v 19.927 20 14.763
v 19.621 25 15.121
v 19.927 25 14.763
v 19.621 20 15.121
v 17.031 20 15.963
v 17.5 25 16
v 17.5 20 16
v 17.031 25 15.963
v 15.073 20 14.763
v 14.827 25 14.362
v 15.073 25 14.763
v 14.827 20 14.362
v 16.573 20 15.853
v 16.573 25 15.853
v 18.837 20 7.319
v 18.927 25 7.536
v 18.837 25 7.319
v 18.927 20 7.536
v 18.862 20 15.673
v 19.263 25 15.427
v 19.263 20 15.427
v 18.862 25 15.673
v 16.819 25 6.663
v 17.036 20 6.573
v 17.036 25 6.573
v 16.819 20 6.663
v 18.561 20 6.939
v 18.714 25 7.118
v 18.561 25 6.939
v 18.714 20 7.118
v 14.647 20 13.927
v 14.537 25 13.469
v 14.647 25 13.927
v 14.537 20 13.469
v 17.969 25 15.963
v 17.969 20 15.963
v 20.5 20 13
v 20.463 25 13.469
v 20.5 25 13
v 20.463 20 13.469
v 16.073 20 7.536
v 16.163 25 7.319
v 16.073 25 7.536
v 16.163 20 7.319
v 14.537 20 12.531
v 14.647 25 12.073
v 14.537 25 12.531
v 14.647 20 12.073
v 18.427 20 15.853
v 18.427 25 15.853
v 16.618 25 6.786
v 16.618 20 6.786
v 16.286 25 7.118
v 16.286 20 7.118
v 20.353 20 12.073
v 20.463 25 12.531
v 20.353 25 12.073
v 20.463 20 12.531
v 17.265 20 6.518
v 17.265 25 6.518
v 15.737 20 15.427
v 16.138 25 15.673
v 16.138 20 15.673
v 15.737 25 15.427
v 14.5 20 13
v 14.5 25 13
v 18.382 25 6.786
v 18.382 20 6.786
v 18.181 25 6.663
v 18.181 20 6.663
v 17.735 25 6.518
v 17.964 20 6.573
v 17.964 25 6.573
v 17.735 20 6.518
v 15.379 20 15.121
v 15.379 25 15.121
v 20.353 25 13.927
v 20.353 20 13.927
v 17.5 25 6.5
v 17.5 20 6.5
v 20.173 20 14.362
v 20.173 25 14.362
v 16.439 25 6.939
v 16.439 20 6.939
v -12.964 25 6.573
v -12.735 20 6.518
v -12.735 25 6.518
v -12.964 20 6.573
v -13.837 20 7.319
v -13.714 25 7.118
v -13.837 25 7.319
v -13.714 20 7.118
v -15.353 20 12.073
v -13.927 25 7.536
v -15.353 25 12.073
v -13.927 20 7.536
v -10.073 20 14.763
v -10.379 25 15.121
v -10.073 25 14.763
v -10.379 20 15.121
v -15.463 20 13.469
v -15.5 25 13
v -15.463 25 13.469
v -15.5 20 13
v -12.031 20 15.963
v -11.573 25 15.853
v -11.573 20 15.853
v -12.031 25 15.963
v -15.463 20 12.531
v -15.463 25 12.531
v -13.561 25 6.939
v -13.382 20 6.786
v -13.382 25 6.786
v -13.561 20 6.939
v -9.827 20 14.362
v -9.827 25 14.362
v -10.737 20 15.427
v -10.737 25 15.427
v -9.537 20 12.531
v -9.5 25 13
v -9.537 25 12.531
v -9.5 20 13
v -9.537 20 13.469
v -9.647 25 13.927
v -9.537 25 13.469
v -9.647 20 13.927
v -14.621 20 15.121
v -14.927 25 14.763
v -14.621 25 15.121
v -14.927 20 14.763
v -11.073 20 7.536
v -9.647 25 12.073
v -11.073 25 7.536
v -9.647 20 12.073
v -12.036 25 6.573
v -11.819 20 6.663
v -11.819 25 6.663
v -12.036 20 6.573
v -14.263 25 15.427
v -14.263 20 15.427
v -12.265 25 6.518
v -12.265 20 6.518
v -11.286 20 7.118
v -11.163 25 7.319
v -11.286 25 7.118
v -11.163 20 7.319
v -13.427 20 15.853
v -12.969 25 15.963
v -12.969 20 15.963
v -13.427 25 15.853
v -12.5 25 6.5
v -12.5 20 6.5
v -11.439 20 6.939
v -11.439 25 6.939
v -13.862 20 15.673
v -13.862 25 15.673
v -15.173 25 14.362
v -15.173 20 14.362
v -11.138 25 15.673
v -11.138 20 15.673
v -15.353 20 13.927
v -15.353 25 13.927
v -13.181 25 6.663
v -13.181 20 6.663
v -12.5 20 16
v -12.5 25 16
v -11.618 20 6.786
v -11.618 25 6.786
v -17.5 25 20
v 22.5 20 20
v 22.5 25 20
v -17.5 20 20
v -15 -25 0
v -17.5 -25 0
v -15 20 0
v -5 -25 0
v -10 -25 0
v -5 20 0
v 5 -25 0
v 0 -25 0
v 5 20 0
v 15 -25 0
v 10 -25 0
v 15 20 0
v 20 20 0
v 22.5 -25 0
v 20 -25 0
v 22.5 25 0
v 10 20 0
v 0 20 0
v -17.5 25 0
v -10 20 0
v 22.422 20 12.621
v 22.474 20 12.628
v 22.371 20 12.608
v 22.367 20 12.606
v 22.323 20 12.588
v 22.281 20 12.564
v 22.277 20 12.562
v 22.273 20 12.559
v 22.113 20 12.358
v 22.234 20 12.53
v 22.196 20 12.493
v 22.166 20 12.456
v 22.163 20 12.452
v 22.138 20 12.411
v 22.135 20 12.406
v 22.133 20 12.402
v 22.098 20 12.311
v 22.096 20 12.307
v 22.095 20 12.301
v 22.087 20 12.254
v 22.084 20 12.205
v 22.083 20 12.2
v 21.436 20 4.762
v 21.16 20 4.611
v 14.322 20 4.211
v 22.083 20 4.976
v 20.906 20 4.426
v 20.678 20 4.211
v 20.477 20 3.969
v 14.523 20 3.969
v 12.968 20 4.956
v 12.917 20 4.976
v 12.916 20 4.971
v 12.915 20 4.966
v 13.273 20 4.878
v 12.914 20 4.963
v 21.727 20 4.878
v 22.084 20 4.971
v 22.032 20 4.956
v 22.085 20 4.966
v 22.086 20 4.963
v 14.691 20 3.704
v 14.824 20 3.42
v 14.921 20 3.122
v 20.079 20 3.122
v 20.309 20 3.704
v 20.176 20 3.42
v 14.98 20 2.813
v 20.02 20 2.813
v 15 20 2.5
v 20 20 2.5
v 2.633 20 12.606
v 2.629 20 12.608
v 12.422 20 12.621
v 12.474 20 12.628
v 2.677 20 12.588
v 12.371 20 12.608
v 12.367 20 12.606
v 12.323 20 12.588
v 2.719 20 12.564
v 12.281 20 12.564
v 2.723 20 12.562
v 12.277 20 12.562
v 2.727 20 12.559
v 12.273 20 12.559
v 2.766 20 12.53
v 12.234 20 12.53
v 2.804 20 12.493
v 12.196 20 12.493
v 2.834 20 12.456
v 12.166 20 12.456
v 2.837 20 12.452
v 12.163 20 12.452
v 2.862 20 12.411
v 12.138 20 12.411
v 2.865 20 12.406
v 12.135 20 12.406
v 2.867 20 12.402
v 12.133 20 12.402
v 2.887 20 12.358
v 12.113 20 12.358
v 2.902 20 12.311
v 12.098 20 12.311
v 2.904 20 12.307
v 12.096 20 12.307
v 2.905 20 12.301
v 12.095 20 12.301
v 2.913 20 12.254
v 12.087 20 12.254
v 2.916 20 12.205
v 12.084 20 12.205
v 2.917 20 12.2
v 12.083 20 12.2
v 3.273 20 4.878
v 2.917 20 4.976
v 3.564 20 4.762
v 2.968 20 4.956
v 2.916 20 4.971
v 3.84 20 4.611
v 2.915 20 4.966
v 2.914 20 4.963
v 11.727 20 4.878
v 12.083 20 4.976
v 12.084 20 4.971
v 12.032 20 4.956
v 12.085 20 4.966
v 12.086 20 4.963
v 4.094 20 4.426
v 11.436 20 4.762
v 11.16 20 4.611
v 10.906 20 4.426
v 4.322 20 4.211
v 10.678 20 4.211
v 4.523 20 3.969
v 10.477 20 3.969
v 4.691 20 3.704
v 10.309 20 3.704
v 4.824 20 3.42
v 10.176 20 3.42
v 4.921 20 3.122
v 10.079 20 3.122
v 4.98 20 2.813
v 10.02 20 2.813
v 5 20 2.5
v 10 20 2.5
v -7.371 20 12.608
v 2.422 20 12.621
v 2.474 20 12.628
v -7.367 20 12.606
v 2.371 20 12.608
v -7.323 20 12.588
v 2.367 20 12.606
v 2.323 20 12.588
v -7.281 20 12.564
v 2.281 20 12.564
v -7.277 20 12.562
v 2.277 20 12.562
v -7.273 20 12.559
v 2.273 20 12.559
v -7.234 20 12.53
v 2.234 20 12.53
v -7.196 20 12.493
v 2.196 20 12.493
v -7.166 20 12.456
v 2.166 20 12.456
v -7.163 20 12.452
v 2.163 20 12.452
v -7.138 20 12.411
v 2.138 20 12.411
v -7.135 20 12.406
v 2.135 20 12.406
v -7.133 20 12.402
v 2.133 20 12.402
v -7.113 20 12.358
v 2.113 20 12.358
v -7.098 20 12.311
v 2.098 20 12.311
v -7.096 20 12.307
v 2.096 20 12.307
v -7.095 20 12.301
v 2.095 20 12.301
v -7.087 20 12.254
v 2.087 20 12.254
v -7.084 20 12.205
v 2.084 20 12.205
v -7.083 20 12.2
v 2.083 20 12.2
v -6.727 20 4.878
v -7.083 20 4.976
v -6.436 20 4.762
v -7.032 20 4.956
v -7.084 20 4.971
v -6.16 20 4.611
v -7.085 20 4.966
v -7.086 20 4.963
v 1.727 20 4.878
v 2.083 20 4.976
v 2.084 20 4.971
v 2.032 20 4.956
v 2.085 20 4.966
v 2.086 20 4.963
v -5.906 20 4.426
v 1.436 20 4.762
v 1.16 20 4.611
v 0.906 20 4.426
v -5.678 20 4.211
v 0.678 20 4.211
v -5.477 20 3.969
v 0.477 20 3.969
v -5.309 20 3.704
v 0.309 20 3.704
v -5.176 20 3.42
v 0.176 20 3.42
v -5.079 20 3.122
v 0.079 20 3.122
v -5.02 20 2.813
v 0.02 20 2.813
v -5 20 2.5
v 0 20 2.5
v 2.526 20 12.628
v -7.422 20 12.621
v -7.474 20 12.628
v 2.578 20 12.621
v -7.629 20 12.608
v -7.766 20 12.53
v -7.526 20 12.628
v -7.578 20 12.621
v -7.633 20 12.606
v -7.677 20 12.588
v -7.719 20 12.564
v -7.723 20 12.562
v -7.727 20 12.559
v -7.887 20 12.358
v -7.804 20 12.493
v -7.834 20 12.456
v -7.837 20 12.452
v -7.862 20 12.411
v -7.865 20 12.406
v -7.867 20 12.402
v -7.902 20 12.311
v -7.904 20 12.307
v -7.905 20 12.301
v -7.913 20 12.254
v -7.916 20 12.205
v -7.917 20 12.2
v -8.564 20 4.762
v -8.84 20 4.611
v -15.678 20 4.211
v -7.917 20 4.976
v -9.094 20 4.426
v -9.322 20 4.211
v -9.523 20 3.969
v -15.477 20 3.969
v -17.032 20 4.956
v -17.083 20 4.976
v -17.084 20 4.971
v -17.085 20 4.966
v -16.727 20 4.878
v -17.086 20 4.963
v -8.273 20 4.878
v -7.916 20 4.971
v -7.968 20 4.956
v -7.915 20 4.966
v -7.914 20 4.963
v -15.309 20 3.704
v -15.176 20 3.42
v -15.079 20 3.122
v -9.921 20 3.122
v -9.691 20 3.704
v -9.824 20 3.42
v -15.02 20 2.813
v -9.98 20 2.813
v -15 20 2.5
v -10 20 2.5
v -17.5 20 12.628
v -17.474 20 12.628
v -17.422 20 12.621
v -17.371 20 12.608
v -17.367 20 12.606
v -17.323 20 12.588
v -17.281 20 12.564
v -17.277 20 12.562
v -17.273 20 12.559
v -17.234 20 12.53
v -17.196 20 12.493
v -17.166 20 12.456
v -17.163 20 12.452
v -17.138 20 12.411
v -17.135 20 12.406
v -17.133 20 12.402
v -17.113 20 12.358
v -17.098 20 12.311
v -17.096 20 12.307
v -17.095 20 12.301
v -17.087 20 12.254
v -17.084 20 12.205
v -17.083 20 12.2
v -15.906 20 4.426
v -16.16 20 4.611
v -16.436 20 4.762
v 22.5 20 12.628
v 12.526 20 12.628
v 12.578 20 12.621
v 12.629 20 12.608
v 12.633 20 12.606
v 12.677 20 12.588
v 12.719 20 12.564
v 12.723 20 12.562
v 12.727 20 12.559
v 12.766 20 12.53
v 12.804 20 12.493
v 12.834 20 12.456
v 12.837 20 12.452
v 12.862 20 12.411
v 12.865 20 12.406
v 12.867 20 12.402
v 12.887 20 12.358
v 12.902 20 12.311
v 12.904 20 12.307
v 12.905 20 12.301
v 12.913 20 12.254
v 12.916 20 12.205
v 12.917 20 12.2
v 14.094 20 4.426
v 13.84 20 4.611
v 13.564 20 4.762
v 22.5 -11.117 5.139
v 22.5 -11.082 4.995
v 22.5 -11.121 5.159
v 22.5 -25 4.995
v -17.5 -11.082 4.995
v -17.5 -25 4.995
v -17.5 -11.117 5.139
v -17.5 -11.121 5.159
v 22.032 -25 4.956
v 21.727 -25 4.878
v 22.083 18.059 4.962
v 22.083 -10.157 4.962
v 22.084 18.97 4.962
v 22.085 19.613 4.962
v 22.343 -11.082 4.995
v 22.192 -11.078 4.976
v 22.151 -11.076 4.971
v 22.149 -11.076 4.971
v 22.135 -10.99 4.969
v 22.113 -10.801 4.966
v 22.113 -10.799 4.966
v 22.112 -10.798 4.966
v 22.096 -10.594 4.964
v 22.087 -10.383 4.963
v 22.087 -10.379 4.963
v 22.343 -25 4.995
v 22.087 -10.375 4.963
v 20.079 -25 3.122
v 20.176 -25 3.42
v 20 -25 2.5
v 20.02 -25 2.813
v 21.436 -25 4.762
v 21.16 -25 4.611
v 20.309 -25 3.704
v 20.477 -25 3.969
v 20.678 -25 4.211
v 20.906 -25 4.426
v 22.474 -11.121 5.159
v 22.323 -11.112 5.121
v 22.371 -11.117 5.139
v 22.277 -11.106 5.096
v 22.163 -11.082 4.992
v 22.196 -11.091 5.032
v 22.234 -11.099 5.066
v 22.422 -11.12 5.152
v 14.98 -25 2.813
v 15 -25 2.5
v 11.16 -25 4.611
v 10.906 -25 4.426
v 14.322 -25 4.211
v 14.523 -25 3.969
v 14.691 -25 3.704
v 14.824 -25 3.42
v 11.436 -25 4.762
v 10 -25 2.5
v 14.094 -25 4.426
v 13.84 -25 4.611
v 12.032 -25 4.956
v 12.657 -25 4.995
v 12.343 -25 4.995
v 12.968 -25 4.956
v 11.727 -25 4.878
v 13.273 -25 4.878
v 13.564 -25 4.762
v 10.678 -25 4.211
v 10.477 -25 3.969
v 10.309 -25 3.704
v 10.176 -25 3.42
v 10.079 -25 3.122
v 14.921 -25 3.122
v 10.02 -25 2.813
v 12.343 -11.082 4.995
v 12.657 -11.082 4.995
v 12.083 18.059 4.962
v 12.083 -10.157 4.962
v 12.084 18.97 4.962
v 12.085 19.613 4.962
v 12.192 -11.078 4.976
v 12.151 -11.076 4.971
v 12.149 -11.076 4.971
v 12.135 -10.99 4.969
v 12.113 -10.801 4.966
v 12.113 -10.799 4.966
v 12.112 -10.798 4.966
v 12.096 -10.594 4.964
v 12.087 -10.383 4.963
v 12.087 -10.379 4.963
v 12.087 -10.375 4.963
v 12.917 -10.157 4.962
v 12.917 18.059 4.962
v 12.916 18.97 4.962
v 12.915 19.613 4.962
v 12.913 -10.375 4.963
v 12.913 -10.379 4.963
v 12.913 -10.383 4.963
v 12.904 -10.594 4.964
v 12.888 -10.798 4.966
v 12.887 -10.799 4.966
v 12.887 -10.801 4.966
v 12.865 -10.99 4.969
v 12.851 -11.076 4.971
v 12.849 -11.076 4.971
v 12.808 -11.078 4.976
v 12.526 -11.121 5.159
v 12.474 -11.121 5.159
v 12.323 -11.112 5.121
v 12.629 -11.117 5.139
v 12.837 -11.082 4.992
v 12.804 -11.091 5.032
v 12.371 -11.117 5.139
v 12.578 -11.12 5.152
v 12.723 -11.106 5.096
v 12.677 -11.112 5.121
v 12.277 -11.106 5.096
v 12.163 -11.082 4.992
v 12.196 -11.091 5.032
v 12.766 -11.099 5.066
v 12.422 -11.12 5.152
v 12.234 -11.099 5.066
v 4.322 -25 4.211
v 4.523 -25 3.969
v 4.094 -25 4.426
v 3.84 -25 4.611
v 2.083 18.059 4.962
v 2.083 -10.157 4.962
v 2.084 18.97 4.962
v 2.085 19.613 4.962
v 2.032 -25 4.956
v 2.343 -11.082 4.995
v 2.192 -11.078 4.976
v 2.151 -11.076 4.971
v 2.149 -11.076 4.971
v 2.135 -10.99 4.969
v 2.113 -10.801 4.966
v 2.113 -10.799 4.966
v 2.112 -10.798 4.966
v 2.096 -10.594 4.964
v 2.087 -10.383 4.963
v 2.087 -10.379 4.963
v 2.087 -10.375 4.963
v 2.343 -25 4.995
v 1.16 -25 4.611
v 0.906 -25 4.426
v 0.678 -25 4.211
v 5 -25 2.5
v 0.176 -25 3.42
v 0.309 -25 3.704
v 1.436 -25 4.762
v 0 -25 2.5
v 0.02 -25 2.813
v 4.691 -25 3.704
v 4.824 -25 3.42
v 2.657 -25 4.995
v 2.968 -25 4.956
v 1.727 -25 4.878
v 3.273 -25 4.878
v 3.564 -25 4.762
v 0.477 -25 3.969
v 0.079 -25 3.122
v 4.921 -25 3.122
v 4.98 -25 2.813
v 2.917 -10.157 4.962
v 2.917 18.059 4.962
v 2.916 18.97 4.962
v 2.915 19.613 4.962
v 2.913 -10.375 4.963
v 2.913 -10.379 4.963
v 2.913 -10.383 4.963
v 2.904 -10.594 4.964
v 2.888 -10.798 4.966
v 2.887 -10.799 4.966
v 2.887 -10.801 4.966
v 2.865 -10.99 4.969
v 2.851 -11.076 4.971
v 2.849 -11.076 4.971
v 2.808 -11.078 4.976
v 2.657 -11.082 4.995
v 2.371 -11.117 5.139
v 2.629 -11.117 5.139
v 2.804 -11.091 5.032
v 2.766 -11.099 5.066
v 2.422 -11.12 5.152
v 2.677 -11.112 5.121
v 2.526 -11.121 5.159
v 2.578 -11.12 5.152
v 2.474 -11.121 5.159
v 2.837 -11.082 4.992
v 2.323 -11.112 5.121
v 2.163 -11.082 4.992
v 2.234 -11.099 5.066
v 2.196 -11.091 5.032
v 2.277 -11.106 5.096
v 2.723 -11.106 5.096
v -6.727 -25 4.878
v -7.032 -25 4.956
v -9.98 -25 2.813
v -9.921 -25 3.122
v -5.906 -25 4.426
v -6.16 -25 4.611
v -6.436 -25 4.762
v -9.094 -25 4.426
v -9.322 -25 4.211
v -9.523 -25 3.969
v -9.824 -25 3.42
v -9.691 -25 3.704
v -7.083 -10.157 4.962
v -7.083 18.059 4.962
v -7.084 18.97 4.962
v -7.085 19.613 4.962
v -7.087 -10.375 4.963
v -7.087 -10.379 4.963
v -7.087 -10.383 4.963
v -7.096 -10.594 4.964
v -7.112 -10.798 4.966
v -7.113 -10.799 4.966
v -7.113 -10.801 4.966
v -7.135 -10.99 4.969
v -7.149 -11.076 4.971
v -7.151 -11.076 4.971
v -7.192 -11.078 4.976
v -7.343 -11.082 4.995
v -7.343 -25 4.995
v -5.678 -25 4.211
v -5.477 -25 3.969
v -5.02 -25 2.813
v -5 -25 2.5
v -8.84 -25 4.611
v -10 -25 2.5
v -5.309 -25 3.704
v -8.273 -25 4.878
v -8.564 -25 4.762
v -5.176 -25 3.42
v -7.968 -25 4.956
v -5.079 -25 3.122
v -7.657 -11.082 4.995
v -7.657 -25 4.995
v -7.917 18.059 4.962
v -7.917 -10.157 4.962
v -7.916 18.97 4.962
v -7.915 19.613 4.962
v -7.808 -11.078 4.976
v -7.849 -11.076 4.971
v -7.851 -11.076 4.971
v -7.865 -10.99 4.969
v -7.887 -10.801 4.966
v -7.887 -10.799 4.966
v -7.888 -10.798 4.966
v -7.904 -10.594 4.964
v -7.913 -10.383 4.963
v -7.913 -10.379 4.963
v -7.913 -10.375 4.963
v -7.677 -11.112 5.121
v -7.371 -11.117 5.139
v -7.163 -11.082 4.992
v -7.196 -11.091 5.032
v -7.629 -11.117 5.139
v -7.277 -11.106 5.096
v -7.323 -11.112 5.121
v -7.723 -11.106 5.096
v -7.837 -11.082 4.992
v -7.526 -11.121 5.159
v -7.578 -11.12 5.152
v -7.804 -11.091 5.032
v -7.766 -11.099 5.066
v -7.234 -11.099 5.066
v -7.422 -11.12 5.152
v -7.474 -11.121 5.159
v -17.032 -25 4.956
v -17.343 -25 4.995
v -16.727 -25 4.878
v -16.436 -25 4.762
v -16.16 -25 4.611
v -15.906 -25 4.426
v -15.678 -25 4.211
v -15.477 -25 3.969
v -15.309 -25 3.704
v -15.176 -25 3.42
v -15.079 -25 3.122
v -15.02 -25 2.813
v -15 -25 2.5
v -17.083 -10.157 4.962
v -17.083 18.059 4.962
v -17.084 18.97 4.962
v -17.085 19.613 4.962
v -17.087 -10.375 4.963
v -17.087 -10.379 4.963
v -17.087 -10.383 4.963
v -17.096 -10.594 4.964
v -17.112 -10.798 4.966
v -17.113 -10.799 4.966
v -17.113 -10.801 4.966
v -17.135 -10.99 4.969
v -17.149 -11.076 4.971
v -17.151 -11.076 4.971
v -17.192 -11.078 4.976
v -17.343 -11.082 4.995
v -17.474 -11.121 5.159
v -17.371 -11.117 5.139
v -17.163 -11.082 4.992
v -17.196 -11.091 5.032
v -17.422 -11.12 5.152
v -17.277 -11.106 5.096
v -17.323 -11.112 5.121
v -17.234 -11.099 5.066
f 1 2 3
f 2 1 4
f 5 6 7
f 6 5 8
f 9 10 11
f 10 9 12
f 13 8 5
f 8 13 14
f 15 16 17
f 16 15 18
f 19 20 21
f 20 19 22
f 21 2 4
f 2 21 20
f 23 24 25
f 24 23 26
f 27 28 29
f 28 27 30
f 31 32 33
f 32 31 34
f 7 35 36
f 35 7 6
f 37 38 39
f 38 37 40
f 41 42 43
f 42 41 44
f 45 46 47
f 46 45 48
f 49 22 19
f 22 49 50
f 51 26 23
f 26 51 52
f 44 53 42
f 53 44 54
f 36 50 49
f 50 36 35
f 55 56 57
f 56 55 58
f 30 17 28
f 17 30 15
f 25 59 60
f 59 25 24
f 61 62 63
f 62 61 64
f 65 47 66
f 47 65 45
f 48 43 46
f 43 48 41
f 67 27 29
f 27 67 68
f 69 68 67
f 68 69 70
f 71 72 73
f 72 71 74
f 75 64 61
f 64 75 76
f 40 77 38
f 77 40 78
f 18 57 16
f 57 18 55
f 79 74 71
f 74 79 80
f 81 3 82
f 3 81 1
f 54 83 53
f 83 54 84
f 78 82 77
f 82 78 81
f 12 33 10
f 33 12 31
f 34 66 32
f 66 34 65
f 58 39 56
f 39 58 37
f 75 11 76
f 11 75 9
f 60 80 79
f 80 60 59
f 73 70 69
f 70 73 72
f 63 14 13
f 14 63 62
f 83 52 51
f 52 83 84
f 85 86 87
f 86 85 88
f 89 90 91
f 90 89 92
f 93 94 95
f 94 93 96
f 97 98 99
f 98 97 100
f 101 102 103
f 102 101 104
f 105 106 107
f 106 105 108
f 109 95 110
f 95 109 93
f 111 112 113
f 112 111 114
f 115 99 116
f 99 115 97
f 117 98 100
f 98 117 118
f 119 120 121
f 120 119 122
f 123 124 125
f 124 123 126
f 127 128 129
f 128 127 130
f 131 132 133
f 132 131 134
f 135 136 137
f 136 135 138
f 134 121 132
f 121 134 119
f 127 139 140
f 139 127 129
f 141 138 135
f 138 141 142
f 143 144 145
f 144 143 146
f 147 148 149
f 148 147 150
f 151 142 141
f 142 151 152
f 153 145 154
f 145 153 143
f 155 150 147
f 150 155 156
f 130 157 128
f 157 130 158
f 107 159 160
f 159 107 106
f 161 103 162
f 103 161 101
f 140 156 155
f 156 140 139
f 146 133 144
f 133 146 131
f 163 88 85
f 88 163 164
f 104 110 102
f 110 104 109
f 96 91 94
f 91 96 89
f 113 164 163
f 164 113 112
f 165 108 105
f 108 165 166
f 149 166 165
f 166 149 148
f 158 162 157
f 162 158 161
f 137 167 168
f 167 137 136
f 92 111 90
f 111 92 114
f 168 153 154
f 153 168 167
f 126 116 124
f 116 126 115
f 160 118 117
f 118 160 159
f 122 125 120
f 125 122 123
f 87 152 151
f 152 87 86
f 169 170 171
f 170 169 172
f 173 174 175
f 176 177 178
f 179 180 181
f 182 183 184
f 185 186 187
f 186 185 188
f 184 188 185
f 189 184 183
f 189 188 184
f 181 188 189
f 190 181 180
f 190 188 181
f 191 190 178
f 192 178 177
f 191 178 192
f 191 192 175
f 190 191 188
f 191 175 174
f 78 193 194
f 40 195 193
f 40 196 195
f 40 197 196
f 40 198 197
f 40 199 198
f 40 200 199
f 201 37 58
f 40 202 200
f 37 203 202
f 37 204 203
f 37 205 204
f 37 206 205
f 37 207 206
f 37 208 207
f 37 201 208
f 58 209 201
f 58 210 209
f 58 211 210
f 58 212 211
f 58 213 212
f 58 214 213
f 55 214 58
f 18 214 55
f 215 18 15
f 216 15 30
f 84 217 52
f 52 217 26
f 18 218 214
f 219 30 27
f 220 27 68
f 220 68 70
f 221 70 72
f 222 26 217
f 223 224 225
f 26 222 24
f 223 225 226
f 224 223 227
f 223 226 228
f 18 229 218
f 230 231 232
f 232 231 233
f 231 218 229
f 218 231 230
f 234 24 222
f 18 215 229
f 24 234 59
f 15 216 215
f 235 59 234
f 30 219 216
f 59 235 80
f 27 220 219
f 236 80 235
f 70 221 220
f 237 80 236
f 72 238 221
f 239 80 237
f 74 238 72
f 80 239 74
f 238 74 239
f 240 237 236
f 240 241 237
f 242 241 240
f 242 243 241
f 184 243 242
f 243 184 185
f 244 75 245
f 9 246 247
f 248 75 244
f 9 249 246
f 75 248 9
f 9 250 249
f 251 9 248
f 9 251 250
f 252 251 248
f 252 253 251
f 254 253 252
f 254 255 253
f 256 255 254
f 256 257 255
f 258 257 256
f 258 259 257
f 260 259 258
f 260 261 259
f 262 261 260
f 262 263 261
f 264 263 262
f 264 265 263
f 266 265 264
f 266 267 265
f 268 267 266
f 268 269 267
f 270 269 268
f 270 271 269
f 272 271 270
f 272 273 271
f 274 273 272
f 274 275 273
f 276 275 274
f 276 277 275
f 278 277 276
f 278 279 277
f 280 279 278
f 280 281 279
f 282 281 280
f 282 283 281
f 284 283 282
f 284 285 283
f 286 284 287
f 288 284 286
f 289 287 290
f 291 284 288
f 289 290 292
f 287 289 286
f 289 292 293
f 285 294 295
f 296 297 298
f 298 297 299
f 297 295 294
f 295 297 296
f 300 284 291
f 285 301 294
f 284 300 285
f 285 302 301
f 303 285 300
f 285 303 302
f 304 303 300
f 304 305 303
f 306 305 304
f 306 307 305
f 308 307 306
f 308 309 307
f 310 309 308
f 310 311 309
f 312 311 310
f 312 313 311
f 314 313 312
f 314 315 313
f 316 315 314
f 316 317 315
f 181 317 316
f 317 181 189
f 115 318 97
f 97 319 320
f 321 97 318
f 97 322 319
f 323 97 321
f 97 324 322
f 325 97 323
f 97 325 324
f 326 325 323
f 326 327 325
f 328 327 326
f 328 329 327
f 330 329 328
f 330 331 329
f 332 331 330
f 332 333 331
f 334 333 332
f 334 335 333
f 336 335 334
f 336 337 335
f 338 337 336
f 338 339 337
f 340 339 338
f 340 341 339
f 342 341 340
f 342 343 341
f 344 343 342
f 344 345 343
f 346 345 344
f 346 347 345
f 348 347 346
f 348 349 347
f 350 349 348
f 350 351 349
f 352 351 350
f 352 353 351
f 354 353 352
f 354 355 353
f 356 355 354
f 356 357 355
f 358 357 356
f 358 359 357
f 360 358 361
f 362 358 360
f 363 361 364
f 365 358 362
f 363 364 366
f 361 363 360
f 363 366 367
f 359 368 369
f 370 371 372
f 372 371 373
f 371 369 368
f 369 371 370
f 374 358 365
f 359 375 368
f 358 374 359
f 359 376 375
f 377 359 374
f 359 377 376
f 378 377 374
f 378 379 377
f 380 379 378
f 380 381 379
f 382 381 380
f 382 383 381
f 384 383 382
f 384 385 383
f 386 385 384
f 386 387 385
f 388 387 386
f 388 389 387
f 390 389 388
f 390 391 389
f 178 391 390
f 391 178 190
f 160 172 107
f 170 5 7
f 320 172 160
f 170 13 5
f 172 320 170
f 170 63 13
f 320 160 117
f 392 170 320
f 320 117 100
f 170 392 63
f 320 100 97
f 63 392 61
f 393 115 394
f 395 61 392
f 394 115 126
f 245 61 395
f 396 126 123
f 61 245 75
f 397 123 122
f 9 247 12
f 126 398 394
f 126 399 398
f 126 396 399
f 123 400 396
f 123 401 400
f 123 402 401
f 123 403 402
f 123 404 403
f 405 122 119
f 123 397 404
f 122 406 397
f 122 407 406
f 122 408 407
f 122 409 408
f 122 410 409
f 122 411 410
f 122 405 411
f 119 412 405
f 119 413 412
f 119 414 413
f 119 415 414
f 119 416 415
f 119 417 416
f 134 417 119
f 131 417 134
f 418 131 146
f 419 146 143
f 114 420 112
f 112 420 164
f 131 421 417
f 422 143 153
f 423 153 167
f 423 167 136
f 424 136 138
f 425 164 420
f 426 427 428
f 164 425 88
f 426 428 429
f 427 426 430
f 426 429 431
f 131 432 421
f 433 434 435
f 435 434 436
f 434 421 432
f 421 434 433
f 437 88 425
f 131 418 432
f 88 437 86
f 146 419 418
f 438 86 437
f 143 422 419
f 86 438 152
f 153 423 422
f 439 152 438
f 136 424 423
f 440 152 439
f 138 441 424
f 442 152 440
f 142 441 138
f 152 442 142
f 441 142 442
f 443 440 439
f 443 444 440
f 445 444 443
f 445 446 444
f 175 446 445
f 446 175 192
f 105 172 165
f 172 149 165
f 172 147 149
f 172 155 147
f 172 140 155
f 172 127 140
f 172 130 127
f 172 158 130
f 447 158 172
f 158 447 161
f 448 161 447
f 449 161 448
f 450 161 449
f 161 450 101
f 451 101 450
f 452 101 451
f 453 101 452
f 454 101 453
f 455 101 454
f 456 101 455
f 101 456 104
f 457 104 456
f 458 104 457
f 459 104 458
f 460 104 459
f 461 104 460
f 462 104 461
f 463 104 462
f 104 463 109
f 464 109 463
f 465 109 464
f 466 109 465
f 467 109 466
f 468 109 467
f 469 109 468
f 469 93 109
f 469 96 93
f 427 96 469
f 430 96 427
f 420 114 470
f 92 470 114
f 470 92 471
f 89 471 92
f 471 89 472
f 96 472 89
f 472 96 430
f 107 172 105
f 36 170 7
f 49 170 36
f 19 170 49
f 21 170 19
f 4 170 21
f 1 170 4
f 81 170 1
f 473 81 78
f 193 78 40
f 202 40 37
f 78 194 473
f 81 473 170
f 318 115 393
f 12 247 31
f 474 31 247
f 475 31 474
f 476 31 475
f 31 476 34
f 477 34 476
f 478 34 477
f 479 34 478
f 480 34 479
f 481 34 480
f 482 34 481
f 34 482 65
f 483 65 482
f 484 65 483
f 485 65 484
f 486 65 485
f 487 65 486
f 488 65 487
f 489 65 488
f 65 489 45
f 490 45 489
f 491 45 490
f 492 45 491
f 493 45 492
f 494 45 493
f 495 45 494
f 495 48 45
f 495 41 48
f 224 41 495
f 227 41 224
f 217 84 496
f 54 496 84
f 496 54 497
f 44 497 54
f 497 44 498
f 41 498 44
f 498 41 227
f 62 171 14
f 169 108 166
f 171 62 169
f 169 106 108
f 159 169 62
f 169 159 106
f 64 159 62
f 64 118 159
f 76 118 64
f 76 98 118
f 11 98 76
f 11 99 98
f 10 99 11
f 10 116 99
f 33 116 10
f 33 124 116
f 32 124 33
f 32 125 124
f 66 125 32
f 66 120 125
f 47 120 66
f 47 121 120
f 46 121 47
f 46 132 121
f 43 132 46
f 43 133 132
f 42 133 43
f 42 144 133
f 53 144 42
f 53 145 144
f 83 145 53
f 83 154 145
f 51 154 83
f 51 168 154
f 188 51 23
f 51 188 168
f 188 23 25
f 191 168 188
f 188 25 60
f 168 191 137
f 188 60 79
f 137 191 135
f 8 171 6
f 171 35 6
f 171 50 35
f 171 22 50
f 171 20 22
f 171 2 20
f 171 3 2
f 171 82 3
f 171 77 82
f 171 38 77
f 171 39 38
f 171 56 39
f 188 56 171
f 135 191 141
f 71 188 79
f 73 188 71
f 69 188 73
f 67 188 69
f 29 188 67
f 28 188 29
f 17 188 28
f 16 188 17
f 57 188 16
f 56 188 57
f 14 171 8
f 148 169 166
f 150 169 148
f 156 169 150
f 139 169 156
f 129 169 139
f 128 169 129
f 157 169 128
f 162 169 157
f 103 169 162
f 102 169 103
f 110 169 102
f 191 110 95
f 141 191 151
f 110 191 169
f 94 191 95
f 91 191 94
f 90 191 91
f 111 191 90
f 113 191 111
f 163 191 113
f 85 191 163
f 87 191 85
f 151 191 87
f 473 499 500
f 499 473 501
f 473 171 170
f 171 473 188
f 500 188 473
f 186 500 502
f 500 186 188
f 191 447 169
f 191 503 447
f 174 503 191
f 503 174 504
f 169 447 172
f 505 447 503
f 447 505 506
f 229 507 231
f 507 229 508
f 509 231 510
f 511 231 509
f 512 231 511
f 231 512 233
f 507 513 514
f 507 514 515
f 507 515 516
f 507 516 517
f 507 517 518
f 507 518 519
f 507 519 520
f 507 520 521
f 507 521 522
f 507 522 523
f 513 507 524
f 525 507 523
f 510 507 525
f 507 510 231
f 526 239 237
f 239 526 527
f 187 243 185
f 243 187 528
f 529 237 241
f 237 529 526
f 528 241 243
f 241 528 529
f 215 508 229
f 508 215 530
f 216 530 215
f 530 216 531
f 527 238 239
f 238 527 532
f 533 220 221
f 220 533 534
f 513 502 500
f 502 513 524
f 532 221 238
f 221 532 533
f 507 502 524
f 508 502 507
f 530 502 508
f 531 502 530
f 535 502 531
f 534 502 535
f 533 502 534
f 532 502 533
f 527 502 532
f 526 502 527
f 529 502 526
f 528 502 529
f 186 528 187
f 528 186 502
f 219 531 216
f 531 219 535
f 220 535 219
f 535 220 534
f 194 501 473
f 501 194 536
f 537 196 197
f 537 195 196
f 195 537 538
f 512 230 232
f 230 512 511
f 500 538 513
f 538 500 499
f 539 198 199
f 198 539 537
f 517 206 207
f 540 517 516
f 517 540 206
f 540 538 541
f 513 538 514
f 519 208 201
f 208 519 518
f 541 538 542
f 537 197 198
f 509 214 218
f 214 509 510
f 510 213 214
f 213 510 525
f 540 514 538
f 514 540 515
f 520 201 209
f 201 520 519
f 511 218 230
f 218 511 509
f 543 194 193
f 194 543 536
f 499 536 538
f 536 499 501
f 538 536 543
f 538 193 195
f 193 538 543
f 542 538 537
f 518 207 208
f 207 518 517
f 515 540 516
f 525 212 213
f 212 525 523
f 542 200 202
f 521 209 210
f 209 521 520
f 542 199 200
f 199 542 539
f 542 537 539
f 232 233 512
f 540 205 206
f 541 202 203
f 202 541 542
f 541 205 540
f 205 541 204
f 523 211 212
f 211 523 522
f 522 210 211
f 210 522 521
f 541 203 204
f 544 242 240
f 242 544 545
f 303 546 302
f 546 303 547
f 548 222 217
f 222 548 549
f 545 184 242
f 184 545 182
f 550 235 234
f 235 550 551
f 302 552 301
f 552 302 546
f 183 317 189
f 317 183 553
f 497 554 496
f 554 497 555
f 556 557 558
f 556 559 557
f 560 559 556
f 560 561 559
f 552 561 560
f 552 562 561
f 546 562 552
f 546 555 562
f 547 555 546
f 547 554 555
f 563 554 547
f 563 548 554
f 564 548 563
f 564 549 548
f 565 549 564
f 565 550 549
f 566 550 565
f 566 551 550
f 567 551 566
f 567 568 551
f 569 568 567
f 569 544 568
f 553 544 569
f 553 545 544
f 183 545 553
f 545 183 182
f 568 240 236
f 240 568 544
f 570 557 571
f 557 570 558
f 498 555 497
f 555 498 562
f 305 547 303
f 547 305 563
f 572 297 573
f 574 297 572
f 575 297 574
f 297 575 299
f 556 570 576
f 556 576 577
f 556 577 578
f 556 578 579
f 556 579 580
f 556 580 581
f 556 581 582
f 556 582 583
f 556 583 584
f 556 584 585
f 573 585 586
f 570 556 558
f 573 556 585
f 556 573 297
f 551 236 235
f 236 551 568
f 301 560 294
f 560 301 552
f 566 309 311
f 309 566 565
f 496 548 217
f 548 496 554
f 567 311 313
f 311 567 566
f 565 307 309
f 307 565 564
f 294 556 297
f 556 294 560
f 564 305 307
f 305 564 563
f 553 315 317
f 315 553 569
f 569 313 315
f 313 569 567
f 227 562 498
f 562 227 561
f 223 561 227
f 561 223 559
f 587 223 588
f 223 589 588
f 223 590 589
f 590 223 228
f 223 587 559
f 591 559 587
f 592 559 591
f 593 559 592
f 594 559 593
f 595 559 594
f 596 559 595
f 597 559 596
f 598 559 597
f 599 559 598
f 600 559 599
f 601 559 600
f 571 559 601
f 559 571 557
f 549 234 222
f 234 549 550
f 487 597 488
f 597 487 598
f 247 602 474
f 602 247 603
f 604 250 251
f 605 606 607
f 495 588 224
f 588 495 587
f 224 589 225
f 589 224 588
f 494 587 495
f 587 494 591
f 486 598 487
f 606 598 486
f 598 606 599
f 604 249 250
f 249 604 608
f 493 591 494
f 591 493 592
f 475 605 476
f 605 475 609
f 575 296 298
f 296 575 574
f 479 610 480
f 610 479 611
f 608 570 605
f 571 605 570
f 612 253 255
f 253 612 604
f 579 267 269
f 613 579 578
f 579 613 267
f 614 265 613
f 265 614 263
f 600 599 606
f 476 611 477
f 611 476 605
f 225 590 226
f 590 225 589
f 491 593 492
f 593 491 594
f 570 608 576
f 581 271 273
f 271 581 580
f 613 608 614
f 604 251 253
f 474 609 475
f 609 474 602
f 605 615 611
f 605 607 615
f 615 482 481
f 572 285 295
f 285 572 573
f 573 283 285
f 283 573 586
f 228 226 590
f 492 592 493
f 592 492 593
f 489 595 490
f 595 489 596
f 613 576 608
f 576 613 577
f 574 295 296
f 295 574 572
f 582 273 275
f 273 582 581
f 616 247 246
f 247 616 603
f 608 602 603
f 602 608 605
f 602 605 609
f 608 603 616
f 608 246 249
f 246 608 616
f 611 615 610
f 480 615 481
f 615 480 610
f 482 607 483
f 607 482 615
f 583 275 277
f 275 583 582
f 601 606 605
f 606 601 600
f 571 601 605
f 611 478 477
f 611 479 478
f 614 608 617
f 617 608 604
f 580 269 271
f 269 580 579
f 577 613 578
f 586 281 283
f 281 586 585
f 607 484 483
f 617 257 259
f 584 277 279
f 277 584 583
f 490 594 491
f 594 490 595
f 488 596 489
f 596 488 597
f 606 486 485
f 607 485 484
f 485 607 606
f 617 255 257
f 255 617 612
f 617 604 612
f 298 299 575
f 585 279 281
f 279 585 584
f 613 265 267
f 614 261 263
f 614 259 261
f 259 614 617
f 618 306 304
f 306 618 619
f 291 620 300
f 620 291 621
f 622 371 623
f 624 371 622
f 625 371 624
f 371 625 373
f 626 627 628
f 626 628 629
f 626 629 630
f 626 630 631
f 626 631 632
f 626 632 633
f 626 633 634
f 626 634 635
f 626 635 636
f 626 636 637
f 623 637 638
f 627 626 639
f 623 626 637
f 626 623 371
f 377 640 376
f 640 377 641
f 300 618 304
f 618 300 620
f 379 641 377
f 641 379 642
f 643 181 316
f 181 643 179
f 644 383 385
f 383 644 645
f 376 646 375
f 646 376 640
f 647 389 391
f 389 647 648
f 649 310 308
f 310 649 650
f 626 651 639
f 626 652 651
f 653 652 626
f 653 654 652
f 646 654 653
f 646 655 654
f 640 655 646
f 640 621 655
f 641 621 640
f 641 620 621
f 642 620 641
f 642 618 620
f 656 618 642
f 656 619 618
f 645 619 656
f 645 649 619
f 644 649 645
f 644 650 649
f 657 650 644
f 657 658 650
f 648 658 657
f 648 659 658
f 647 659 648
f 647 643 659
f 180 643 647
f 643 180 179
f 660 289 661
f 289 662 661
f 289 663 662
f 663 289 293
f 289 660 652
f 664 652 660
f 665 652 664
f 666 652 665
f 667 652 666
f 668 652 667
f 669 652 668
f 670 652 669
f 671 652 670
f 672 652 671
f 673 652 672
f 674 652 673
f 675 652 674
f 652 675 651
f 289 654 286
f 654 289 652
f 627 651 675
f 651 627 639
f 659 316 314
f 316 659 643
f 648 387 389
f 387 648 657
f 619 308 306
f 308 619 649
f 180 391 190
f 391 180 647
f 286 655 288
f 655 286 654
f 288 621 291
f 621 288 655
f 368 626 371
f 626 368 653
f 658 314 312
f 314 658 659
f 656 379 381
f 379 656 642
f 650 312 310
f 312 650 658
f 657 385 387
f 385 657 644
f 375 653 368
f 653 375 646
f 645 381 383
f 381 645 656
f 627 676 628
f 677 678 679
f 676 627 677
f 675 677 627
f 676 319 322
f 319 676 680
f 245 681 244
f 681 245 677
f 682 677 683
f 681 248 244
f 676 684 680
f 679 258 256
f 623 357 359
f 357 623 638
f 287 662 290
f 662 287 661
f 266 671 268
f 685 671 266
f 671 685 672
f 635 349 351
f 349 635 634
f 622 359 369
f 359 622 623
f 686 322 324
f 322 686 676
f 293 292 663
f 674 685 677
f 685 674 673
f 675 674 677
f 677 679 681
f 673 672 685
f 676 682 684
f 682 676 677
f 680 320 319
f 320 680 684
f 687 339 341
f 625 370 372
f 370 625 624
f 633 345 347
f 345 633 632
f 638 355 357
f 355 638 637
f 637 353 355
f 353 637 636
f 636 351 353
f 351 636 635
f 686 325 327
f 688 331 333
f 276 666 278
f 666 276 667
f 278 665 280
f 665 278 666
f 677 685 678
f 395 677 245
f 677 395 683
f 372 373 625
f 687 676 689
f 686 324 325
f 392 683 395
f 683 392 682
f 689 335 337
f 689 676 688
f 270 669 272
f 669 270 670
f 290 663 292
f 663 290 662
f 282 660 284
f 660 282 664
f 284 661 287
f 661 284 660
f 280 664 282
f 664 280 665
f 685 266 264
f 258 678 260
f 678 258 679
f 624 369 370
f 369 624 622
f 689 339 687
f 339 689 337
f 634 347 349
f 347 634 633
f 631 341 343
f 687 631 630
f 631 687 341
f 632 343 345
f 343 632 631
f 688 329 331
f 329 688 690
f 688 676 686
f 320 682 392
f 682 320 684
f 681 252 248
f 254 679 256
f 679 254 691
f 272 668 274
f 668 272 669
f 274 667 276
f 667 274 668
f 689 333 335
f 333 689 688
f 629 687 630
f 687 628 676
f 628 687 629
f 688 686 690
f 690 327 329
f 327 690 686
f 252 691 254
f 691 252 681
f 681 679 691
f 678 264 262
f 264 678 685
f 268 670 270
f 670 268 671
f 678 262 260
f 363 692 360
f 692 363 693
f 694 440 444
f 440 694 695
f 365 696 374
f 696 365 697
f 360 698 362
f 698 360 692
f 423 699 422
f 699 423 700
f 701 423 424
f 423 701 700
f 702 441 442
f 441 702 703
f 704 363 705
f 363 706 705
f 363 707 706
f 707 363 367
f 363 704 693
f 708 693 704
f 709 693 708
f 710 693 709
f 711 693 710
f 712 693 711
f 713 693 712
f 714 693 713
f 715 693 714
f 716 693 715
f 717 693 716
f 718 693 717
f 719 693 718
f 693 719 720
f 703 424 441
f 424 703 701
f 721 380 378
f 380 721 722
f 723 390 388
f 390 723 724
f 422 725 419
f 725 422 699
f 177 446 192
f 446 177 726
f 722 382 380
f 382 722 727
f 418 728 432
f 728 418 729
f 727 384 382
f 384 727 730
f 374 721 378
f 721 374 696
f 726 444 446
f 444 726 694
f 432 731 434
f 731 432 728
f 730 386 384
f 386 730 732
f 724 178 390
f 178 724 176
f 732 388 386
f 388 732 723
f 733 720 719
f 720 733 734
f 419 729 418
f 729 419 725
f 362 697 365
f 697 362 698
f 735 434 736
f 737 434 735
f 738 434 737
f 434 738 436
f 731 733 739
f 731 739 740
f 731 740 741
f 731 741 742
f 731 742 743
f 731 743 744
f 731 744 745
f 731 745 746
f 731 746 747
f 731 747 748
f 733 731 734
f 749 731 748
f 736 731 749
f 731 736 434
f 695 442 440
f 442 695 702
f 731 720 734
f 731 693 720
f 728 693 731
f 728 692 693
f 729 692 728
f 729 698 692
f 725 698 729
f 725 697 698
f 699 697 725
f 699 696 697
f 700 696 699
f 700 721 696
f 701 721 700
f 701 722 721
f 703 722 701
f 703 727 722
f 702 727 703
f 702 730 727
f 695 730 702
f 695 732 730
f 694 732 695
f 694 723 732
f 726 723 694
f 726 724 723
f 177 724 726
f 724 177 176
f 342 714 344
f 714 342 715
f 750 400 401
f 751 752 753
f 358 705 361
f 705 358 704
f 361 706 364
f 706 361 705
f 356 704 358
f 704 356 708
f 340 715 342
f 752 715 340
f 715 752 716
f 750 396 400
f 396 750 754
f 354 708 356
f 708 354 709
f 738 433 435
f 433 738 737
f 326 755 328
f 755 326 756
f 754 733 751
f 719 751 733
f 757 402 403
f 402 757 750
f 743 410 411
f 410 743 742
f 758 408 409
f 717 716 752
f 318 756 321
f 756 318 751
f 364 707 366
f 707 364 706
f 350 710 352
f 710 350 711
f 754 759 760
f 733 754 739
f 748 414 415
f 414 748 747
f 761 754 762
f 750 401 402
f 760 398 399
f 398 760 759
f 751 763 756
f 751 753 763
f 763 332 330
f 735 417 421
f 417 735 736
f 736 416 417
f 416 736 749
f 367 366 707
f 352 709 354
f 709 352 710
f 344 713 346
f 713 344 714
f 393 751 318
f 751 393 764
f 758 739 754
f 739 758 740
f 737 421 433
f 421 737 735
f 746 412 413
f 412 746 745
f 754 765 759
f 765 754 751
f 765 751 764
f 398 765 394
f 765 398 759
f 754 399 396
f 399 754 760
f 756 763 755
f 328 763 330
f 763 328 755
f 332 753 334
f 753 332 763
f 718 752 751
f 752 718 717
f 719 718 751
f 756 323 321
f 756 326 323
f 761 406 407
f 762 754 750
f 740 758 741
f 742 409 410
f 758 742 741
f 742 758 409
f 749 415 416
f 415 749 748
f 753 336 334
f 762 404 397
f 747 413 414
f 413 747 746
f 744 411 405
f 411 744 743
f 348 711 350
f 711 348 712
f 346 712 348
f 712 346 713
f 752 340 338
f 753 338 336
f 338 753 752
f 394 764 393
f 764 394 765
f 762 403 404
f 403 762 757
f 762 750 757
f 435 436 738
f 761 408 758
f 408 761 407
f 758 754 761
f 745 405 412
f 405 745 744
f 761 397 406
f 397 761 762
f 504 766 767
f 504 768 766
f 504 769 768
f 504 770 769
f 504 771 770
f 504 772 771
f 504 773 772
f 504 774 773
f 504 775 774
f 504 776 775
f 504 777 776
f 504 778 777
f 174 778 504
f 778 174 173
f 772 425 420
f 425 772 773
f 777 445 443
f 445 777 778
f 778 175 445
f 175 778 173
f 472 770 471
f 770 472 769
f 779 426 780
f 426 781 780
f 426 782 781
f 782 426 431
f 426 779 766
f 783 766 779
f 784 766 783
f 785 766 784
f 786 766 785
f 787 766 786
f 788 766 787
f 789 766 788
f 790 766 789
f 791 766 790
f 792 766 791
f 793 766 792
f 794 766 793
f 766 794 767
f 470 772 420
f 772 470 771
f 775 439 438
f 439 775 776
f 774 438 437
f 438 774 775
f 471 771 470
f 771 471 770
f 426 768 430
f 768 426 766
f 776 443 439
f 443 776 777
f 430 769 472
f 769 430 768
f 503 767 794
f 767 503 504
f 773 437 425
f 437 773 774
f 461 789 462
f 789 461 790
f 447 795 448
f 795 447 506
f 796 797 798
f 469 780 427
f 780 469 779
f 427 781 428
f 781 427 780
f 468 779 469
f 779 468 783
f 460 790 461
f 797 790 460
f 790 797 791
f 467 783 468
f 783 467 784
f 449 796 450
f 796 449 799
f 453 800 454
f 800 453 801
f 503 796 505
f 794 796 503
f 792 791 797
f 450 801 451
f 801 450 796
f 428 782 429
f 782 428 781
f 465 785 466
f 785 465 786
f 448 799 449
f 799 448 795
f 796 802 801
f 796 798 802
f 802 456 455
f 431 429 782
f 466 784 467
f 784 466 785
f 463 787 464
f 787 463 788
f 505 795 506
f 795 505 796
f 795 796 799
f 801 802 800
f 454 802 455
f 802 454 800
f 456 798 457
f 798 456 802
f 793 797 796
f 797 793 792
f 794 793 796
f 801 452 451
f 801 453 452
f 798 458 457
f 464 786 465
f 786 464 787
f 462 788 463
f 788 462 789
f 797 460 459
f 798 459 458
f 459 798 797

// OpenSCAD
/******************************************************************************/
/**********                     INFO                                 **********/
/******************************************************************************/

/*
Wall Mount Test lead Hanger Rev 1.1 March 2016
you can adjust the number of fingers, length and gap.  
The wall mount piece will auto adjust total width to accommodate the above parameters
by David Buhler

1.1
-added hole size fix for small finger gaps and large wall mount hole size
-fixed minimum finger length support cylinder length
-adjusted variable settings for customizer so user input doesn't create wierd holes and gaps
-added side trimming to reduce size and plastic use.

*/

/******************************************************************************/
/**********                     Settings                             **********/
/******************************************************************************/
//adjust the follow to meet your needs,  all measurements in mm.

/* [BACK] */
//Height of wall mounting plate
back_height=20;//[12:50]

//Mounting plate thickness
back_thickness=5;//[3:10] 

/* [FINGERS] */
//Finger slope(degrees)
back_tilt=0;//[0:8]

//Number of fingers
numberof_fingers=5;//[3:15]

//Slot length
finger_length=50;//[20:100]

//determines weight holding ability
finger_thickness=5; //[2:7]

//how much room for the clips
finger_width=5; //[5:20]

//how wide the slot will be(cable thickness)
finger_gap=5;//[1:15]

/* [SCREW-HOLES] */
//add mounting holes?
mount_holes="yes";//[yes,no]

//thread size in mm
hole_size=3;//[1:6]

/* [FINGER SHAPE] */
//select one the the two following finger shapes
finger_shape="round";//[round,square]
//Trim the sides?
trim_sides= "yes"; // [yes,no]


/* [BUILD PLATE] */
//for display only, doesn't contribute to final object
build_plate_selector = 3; //[0:Replicator 2,1: Replicator,2:Thingomatic,3:Manual]
//when Build Plate Selector is set to "manual" this controls the build plate x dimension
build_plate_manual_x = 200; //[100:400]
//when Build Plate Selector is set to "manual" this controls the build plate y dimension
build_plate_manual_y = 200; //[100:400]
build_plate(build_plate_selector,build_plate_manual_x,build_plate_manual_y);

/******************************************************************************/
/**********                   Variable Calcs                         **********/
/****placement of the finger support structure, no need to adjust these********/
/******************************************************************************/
/* [HIDDEN] */
s_width=finger_width/6; //Support triangle width  could just make a fixed width rather than based on finger width
s_height=back_height/2.5;//Support triangle height based on the back height
s_length=finger_length/3*2;//Support triangle lenght based on the finger length 
s_placement_x=(finger_width/2)-(s_width/2);//where to place the X starting point of the support 
s_placement_y=back_thickness/3; //where to place the Y starting point of the support, /3 to accommodate the back tilt 
s_placement_z=finger_thickness;//where to place the Z starting point of the support 


/******************************************************************************/
/**********                  Make It Happen Stuff                    **********/
/******************************************************************************/

echo ("Project Size (wide x height x finger length " ,numberof_fingers*(finger_width+finger_gap)," x ",back_height," x ",finger_length+back_thickness);

//centre the whole project on x0,y0
rotate ([0,0,180])translate ([-(numberof_fingers*(finger_width+finger_gap))/2,-finger_length/2,0])
    {
    difference()//had to stick three difference calls to trim sides.  weird!
        { 
       if (mount_holes=="yes")
            {
            rotate ([back_tilt,0,0]) 
                difference()
                {
                cube([(numberof_fingers*(finger_width+finger_gap))-finger_gap,back_thickness,back_height]);//make plate with auto width based on fingers+width+gap
                Holes ();
                };
            }
        else
            {
            rotate ([back_tilt,0,0]) 
                cube ([(numberof_fingers*(finger_width+finger_gap))-finger_gap,back_thickness,back_height]);//make plate with auto width based on fingers+width+gap
        }
    trim_sides();
    }
    for (inc=[0:finger_width+finger_gap:(numberof_fingers*(finger_width+finger_gap))-finger_gap]) //auto gen each finger and support placement distance
        {
        difference()//had to stick three difference calls to trim sides.  weird!
            {
        if (finger_shape=="round")
            {
            finger(inc,finger_thickness,finger_width,finger_length);//for rounded couner fingers
            }
        else if(finger_shape=="square")
            {
            translate ([inc,0,0])cube ([finger_width,finger_length,finger_thickness]);//for square fingers
            }
           trim_sides();
           }
         difference()//had to stick three difference calls to trim sides.  weird!
           {
           hull ()//created the support surface along with the rounded edge
            {
            difference ()
                {
                translate ([inc-s_width/2+finger_width/2,s_placement_y,s_placement_z])
                    cube ([s_width,s_length,s_height]);
                rotate ([-atan(s_height/s_length),0,0]) 
                    translate ([inc-.1-s_width+finger_width/2,0-back_thickness,s_height+finger_thickness-.2])
                    cube ([s_width*2,s_length*2,s_height*2]);  
                }
            translate ([inc+s_placement_x+s_width/2,s_placement_y,s_height+finger_thickness]) 
                rotate ([-atan(s_height/s_length)-90,0,0]) 
                cylinder(r=s_width/2,h=s_length+2,$fn=50); 
             }    
            trim_sides();
           }
        }
    }
    
//trims the side of the block to reduce size and unneeded support
module trim_sides()
    {
     if (trim_sides=="yes")
        {
        translate ([-finger_width/2,-5,-0.1]) 
            cube ([finger_width,finger_length+back_thickness+5,back_height+5]);
        translate ([((numberof_fingers)*(finger_width+finger_gap))-finger_gap-finger_width/2,-5,-0.1]) 
            cube ([finger_width,finger_length+back_thickness+5,back_height+5]);   
        }
     }
//creates the rounded fingers
module finger(position,thickness,width,length){
    hull(){
       rotate([-90,0,0])
            translate ([position+thickness/2,-thickness/2,0]) 
            cylinder (r=thickness/2,h=length,$fn=50);//left cylinder
       rotate([-90,0,0])
            translate ([position+width-thickness/2,-thickness/2,0]) 
            cylinder (r=thickness/2,h=length,$fn=50);//right cylinder 
       translate ([position,0,0])
            cube ([width,length,thickness/2]);//flat bottom (top when hanging)
    }
    
}
//creates the hole slots and placement based on number of fingers
module Holes ()
    {
    hole_size= hole_size*3 > back_height ? floor(back_height/5):hole_size; 
    hole_size= hole_size > finger_gap ? finger_gap:(hole_size==finger_gap ? hole_size-1:hole_size);
    if (numberof_fingers<7)
        {
        hull()
            { 
            rotate ([-90,0,0]) 
                translate([finger_width+(finger_gap/2),(-back_height/5*2)-hole_size-2,-2]) 
                cylinder(r=hole_size,h=50,$fn=40);    
            rotate ([-90,0,0]) 
                translate([finger_width+(finger_gap/2),-back_height/5*2,-2]) 
                cylinder(r=hole_size/2,h=50,$fn=40);   
            }
       hull()
            { 
            rotate ([-90,0,0]) 
                translate([((numberof_fingers-1)*(finger_width+finger_gap))-finger_gap/2,-back_height/5*2-hole_size-2,-2])        
                cylinder(r=hole_size,h=50,$fn=40);    
            rotate ([-90,0,0]) 
                translate([((numberof_fingers-1)*(finger_width+finger_gap))-finger_gap/2,-back_height/5*2,-2]) 
                cylinder(r=hole_size/2,h=50,$fn=40);   
            }
         } 
     else if (numberof_fingers>6)
        {
        hull()
            { 
            rotate ([-90,0,0]) 
                translate([(finger_width+finger_gap)*2-finger_gap/2,-back_height/5*2-hole_size-2,-2]) 
                cylinder(r=hole_size,h=50,$fn=40);    
            rotate ([-90,0,0]) 
                translate([(finger_width+finger_gap)*2-finger_gap/2,-back_height/5*2,-2]) 
                cylinder(r=hole_size/2,h=50,$fn=40);   
            }
       hull()
            { 
            rotate ([-90,0,0]) 
                translate([((numberof_fingers-2)*(finger_width+finger_gap))-finger_gap/2,-back_height/5*2-hole_size-2,-2])        
                cylinder(r=hole_size,h=50,$fn=40);    
            rotate ([-90,0,0]) 
                translate([((numberof_fingers-2)*(finger_width+finger_gap))-finger_gap/2,-back_height/5*2,-2]) 
                cylinder(r=hole_size/2,h=50,$fn=40);   
            }
         }    
     }
     
//display build plate on screen for reference 
module build_plate(bp,manX,manY){

		translate([0,0,-.52]){
			if(bp == 0){
				%cube([285,153,1],center = true);
			}
			if(bp == 1){
				%cube([225,145,1],center = true);
			}
			if(bp == 2){
				%cube([120,120,1],center = true);
			}
			if(bp == 3){
				%cube([manX,manY,1],center = true);
			}
		
		}
		translate([0,0,-.5]){
			if(bp == 0){
				for(i = [-14:14]){
					translate([i*10,0,0])
					%cube([.5,153,1.01],center = true);
				}
				for(i = [-7:7]){
					translate([0,i*10,0])
					%cube([285,.5,1.01],center = true);
				}	
			}
			if(bp == 1){
				for(i = [-11:11]){
					translate([i*10,0,0])
						%cube([.5,145,1.01],center = true);
				}
				for(i = [-7:7]){
					translate([0,i*10,0])
						%cube([225,.5,1.01],center = true);
				}
			}
			if(bp == 2){
				for(i = [-6:6]){
					translate([i*10,0,0])
						%cube([.5,120,1.01],center = true);
				}
				for(i = [-6:6]){
					translate([0,i*10,0])
						%cube([120,.5,1.01],center = true);
				}
			}
			if(bp == 3){
				for(i = [-(floor(manX/20)):floor(manX/20)]){
					translate([i*10,0,0])
						%cube([.5,manY,1.01],center = true);
				}
				for(i = [-(floor(manY/20)):floor(manY/20)]){
					translate([0,i*10,0])
						%cube([manX,.5,1.01],center = true);
				}
			}
		}
}
